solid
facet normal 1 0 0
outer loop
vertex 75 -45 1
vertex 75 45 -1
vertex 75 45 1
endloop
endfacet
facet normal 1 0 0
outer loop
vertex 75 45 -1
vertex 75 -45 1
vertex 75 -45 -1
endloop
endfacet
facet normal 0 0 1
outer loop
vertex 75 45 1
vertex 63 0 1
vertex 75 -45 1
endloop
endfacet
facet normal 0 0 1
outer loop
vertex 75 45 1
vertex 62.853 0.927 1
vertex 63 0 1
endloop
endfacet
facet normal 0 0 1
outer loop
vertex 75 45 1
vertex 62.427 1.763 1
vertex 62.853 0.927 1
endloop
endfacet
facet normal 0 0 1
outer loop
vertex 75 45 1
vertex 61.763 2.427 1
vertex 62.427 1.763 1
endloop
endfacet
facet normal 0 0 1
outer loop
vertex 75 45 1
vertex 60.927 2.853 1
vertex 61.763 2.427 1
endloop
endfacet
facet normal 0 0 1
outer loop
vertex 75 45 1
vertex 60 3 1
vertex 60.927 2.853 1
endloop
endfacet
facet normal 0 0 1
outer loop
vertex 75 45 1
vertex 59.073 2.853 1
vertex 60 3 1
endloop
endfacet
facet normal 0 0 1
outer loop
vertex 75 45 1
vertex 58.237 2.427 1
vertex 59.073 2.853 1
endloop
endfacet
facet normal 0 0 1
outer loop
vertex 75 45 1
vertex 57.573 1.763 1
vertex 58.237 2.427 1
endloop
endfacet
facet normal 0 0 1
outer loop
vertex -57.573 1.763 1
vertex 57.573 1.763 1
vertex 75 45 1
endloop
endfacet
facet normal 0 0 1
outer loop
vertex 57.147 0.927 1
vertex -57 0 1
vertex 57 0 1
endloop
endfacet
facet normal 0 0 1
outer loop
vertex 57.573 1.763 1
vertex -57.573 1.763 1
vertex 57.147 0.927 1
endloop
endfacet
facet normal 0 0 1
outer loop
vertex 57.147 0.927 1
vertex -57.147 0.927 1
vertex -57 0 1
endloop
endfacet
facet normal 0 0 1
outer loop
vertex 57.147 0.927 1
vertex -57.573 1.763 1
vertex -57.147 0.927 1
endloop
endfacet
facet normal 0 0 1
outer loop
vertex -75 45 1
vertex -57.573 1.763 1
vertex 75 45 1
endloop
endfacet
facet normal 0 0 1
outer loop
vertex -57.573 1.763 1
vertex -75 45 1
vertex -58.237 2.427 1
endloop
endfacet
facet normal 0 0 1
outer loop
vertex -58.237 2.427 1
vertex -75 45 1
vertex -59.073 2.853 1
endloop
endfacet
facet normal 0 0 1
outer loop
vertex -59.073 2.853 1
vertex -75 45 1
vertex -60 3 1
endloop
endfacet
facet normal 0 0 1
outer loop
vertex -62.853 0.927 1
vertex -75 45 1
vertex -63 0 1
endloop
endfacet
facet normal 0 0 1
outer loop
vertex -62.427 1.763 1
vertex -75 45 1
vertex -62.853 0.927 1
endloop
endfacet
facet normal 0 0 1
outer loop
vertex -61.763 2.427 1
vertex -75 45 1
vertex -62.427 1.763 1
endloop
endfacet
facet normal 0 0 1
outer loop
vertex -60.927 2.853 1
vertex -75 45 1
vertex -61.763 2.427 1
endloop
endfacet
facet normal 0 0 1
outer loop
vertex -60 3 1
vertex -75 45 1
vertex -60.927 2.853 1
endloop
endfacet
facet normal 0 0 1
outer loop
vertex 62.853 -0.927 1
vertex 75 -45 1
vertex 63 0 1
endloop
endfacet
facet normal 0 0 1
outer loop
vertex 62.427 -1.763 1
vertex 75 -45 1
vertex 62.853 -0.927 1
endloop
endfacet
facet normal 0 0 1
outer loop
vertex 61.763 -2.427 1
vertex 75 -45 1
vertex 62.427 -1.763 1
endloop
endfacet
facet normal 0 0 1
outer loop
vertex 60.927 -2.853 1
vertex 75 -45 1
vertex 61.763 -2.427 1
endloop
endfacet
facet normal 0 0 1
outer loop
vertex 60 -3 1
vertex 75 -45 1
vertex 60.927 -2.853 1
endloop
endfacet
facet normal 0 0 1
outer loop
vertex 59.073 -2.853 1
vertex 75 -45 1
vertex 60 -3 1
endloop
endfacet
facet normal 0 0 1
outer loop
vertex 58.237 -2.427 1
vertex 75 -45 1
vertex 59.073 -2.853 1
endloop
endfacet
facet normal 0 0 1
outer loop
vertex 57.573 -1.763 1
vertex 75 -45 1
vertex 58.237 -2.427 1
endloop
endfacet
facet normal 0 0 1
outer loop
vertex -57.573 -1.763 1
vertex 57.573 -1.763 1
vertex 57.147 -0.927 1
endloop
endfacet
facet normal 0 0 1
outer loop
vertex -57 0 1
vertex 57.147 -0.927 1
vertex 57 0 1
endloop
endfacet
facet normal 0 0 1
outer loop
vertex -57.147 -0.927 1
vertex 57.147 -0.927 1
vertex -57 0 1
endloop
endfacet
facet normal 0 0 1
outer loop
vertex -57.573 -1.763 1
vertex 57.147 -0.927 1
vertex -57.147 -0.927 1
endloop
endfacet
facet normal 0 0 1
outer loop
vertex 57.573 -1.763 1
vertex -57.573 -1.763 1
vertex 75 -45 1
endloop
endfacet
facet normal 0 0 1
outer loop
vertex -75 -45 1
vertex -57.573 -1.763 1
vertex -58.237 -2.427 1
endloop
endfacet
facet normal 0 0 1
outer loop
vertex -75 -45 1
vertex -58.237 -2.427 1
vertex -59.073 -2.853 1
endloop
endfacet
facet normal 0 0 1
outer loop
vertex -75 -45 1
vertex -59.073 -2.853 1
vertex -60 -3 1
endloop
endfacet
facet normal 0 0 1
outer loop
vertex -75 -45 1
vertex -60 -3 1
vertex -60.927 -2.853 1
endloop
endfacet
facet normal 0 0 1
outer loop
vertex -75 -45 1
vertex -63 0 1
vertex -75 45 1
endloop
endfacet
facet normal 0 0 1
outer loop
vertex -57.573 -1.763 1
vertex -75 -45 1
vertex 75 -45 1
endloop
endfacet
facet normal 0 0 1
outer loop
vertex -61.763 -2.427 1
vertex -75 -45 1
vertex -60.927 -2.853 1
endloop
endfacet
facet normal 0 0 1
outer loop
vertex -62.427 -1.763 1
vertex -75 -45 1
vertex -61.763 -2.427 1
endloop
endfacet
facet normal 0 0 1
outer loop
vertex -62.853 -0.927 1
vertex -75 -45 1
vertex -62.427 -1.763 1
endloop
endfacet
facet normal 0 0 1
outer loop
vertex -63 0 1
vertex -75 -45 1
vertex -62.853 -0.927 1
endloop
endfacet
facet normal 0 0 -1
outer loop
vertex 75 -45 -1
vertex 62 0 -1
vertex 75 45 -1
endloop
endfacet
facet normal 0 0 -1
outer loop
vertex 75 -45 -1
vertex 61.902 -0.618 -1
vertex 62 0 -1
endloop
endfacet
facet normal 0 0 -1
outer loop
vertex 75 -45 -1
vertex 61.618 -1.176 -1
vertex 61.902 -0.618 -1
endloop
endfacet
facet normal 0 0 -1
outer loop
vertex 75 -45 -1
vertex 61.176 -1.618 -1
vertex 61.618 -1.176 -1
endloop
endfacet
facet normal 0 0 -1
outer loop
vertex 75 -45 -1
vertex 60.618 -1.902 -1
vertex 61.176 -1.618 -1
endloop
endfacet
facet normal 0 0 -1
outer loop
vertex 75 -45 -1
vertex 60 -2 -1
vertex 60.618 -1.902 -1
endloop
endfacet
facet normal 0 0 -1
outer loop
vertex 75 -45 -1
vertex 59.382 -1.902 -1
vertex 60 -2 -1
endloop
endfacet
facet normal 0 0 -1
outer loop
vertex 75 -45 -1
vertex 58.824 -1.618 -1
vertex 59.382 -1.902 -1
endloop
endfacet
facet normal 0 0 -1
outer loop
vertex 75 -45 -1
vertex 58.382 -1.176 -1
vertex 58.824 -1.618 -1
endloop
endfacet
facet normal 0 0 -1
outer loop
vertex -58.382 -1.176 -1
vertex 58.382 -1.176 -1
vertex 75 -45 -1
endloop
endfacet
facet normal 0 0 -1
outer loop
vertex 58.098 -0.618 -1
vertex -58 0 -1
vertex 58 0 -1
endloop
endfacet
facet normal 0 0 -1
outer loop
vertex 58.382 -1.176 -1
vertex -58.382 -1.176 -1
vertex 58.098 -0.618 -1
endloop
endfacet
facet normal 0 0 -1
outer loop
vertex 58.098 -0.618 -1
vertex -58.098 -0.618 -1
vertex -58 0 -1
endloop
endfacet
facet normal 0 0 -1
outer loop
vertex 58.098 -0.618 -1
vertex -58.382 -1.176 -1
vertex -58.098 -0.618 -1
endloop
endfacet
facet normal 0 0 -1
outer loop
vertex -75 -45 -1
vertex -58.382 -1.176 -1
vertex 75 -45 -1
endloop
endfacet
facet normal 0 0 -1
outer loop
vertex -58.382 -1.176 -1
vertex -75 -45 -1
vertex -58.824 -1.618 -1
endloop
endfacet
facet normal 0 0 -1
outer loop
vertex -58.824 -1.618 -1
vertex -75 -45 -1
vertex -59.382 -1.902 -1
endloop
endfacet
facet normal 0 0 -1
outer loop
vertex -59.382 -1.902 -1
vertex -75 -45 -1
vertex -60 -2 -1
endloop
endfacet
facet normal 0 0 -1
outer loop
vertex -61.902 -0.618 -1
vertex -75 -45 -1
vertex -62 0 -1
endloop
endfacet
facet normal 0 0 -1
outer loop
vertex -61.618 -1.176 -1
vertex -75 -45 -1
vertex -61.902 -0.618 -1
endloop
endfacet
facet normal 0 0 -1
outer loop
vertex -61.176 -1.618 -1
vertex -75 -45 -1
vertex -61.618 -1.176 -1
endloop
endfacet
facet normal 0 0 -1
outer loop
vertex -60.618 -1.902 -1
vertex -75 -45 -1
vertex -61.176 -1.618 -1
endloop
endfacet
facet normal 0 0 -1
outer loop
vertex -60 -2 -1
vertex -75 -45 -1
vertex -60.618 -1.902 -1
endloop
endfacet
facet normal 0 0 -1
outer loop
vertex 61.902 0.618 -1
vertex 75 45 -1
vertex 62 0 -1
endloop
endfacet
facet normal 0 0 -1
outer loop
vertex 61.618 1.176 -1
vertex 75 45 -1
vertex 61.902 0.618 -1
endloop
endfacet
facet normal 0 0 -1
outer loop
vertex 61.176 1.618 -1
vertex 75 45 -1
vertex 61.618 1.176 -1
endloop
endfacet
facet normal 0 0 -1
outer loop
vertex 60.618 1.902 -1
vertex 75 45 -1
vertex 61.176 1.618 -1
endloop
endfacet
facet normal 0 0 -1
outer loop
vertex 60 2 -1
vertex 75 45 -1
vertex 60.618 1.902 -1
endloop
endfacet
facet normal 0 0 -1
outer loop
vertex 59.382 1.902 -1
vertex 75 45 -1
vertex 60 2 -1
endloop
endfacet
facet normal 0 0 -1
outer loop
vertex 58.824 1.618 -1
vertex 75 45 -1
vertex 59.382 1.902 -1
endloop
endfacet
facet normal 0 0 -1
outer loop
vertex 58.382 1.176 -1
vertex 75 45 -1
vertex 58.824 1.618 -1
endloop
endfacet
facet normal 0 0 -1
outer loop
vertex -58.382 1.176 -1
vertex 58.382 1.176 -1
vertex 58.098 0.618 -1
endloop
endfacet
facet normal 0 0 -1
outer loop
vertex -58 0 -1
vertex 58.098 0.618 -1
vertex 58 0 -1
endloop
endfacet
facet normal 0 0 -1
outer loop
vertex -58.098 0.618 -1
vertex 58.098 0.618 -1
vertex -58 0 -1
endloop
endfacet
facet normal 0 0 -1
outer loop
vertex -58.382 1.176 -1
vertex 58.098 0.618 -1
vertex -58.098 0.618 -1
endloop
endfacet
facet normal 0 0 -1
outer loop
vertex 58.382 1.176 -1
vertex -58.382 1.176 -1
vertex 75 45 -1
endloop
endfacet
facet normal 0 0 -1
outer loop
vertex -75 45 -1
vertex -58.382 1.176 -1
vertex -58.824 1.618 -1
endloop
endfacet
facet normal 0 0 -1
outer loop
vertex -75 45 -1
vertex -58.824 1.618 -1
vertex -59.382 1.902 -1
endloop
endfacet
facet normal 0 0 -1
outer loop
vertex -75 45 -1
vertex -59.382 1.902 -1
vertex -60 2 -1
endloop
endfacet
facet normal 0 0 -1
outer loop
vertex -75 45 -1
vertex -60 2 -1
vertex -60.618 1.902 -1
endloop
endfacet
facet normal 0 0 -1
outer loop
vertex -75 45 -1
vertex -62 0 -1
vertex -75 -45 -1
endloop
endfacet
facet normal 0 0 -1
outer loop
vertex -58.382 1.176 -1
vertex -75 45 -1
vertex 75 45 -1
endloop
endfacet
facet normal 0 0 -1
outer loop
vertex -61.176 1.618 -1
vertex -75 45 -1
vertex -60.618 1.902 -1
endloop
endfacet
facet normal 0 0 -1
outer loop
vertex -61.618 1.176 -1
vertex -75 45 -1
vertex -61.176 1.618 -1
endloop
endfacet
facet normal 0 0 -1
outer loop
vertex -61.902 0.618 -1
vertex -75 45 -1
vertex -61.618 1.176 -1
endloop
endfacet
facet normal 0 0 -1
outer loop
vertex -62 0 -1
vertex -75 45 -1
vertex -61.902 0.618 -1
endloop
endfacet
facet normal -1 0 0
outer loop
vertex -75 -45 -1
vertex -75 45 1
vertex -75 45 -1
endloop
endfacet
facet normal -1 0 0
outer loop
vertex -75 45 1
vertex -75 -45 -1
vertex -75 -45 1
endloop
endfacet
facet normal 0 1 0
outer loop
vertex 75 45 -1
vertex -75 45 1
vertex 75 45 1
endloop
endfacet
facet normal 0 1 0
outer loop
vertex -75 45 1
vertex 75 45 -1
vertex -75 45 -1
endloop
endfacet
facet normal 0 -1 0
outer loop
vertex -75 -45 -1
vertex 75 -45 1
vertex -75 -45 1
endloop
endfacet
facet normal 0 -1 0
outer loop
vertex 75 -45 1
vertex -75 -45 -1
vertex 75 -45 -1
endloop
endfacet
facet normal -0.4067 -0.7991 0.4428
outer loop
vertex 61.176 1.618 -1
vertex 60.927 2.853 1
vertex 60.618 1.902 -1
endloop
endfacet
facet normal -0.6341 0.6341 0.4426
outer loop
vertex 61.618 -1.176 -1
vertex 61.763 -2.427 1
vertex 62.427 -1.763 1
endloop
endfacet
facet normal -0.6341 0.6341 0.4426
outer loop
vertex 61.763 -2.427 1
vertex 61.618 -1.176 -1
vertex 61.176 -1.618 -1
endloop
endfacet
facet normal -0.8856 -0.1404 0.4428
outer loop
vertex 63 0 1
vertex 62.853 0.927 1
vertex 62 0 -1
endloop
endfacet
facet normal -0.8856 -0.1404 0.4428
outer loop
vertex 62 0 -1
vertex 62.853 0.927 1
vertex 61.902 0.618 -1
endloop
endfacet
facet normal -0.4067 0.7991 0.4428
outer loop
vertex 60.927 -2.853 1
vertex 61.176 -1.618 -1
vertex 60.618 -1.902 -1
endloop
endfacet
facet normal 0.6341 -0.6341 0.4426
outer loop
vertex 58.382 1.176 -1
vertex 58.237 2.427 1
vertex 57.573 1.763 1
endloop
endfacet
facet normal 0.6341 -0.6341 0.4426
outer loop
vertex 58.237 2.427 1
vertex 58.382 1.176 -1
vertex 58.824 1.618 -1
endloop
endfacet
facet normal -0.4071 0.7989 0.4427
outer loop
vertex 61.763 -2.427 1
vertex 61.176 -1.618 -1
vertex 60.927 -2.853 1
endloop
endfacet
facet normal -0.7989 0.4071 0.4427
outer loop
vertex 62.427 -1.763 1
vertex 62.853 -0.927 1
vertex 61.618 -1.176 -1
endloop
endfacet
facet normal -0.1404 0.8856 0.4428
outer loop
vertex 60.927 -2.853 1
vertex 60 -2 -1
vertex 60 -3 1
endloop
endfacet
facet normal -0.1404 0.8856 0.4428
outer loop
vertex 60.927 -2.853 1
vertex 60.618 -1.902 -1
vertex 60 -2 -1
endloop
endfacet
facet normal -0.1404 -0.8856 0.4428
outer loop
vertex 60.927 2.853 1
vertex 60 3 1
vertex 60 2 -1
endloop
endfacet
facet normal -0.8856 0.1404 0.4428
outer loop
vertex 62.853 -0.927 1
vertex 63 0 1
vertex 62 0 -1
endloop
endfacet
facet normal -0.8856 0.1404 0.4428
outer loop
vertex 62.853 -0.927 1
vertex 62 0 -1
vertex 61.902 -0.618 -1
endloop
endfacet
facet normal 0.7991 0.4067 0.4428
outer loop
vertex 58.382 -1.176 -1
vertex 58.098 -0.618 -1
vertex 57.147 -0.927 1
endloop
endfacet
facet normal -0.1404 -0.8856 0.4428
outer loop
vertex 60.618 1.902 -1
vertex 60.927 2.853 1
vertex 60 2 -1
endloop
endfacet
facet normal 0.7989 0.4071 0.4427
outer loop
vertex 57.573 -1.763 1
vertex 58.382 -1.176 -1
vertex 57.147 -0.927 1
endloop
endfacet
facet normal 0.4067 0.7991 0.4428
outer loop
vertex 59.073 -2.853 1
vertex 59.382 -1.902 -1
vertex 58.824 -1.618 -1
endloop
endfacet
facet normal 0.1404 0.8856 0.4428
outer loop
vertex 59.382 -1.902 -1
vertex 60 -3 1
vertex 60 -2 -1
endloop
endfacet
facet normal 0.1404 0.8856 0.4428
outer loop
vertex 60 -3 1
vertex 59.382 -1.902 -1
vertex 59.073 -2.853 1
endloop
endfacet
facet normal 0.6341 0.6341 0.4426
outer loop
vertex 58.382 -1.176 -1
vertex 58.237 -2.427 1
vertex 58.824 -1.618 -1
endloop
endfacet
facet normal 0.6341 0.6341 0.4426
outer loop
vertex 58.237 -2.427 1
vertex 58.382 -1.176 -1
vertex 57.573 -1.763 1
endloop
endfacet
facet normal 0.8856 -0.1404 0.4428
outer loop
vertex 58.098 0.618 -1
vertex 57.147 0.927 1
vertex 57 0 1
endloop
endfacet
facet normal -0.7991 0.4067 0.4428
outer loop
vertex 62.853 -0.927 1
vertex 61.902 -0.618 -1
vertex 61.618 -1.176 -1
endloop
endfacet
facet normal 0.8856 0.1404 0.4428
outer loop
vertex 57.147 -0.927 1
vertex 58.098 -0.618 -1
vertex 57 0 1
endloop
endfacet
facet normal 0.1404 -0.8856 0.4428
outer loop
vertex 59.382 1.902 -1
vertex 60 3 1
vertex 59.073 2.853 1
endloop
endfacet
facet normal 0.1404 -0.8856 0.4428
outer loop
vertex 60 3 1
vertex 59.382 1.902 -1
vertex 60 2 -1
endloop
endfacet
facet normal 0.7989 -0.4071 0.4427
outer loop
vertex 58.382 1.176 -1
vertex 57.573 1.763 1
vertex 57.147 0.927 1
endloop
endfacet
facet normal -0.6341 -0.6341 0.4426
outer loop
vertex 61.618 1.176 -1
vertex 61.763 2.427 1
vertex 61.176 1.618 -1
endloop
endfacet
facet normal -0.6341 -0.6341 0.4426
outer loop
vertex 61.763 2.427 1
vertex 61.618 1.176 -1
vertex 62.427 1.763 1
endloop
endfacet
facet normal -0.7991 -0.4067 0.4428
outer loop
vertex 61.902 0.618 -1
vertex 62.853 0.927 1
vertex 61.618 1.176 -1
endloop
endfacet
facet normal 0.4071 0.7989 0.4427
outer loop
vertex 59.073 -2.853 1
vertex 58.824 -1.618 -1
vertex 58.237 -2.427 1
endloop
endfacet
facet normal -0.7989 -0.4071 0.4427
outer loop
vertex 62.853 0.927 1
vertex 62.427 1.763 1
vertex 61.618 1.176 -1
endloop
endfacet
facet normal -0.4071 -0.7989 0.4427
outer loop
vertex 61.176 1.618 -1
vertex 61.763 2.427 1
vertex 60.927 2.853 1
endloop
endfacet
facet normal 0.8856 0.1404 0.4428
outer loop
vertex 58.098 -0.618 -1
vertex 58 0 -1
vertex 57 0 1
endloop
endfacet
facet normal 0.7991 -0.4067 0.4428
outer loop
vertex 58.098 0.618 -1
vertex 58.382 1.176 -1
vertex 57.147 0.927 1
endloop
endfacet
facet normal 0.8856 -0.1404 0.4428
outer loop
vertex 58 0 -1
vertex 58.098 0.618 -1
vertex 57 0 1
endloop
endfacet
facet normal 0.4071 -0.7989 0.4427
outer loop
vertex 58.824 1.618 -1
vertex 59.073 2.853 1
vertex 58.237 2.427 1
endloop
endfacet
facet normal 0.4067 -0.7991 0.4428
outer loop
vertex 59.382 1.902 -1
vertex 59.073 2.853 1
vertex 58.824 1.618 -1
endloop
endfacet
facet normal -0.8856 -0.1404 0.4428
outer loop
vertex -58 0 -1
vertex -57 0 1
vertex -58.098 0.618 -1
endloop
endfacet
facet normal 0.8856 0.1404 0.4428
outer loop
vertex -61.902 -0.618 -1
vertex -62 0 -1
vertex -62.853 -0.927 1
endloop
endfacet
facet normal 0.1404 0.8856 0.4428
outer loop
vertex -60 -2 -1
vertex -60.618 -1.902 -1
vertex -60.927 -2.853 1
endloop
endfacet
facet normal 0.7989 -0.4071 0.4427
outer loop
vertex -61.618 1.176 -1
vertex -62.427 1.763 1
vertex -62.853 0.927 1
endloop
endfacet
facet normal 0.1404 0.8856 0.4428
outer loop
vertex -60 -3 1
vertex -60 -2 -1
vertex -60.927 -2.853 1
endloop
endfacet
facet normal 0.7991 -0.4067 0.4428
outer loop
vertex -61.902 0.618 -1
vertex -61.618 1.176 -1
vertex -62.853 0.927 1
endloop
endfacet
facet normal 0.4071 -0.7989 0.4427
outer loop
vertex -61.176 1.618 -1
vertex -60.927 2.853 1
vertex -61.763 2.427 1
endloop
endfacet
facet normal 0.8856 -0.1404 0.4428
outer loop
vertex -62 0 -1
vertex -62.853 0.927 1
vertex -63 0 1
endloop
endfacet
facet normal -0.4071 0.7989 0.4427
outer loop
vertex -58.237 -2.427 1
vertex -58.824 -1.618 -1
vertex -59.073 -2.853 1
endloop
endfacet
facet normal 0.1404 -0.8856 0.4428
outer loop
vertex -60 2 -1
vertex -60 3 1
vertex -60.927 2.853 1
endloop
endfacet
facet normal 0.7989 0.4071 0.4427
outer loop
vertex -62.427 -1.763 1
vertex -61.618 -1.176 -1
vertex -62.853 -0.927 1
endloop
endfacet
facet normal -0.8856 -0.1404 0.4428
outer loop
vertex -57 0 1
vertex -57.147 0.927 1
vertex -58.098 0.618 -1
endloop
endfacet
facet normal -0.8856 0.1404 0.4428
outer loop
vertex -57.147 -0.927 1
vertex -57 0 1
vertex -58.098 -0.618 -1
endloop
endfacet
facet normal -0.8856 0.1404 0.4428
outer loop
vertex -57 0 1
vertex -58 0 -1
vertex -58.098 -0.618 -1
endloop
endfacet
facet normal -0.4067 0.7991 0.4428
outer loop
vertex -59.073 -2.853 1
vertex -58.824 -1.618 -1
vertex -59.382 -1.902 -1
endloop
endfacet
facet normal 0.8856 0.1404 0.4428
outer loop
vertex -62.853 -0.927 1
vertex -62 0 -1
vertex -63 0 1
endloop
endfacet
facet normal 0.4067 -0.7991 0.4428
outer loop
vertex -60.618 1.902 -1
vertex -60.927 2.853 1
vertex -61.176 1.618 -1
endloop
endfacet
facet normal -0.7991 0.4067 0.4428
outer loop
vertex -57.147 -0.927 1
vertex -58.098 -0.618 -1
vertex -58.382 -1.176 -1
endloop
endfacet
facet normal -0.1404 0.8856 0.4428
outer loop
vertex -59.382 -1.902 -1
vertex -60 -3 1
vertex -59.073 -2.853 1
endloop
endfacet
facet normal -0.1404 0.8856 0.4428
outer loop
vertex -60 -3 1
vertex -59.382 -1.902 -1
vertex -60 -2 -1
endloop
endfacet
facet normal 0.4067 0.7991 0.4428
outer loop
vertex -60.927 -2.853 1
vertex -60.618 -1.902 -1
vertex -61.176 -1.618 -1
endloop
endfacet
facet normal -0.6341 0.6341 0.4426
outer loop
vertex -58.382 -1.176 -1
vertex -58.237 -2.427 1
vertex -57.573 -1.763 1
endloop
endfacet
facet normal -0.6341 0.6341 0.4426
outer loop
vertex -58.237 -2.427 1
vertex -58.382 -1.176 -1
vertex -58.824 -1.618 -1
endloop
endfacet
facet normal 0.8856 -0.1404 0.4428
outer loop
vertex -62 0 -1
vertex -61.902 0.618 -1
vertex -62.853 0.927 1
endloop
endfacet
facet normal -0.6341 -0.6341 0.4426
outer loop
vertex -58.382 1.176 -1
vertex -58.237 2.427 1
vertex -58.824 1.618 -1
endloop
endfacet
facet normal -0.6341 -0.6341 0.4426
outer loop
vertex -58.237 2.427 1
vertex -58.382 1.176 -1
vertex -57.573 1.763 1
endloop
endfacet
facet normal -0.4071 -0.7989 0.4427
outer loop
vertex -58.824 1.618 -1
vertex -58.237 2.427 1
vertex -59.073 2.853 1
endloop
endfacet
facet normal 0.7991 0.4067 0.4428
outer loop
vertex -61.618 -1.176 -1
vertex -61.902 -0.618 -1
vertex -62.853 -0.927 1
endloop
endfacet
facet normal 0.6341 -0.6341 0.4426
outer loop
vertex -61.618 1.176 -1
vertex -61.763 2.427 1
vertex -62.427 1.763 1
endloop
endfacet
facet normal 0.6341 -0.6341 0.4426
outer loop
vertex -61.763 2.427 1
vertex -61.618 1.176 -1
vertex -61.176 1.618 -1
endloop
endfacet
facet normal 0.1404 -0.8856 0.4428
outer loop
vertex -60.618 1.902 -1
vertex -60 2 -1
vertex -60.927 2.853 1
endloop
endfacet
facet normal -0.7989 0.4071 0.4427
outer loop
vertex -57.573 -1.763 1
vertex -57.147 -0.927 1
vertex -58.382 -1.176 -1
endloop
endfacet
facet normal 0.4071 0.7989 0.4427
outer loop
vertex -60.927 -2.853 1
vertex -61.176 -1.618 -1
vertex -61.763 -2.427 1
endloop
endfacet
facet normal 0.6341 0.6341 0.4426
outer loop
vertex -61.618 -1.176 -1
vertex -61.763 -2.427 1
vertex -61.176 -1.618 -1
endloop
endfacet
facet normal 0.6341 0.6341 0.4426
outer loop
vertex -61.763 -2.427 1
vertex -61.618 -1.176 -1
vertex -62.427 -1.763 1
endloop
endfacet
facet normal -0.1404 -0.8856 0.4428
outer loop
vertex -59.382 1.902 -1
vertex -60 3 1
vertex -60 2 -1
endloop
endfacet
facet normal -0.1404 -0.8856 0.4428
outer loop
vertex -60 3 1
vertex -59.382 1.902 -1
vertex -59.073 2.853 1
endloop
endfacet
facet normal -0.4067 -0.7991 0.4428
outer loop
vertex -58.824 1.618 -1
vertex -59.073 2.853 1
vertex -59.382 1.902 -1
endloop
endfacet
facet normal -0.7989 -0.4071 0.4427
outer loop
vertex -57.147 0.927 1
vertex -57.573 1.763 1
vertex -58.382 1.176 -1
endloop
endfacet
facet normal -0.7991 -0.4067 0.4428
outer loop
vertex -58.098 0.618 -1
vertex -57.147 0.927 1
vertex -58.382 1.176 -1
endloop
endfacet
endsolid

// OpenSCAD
x = 150;
y = 90;
z = 2;

$fn=20;

hole_d = 4;
hole_d2 = 6;
hole_distance = 120;

module hole() {
 cylinder(d1=hole_d, d2=hole_d2, h=z, center=true);   
}


difference() {
cube([x, y, z], true);
translate([0.5*hole_distance, 0, 0]) hole();
translate([-0.5*hole_distance, 0, 0]) hole();
}
